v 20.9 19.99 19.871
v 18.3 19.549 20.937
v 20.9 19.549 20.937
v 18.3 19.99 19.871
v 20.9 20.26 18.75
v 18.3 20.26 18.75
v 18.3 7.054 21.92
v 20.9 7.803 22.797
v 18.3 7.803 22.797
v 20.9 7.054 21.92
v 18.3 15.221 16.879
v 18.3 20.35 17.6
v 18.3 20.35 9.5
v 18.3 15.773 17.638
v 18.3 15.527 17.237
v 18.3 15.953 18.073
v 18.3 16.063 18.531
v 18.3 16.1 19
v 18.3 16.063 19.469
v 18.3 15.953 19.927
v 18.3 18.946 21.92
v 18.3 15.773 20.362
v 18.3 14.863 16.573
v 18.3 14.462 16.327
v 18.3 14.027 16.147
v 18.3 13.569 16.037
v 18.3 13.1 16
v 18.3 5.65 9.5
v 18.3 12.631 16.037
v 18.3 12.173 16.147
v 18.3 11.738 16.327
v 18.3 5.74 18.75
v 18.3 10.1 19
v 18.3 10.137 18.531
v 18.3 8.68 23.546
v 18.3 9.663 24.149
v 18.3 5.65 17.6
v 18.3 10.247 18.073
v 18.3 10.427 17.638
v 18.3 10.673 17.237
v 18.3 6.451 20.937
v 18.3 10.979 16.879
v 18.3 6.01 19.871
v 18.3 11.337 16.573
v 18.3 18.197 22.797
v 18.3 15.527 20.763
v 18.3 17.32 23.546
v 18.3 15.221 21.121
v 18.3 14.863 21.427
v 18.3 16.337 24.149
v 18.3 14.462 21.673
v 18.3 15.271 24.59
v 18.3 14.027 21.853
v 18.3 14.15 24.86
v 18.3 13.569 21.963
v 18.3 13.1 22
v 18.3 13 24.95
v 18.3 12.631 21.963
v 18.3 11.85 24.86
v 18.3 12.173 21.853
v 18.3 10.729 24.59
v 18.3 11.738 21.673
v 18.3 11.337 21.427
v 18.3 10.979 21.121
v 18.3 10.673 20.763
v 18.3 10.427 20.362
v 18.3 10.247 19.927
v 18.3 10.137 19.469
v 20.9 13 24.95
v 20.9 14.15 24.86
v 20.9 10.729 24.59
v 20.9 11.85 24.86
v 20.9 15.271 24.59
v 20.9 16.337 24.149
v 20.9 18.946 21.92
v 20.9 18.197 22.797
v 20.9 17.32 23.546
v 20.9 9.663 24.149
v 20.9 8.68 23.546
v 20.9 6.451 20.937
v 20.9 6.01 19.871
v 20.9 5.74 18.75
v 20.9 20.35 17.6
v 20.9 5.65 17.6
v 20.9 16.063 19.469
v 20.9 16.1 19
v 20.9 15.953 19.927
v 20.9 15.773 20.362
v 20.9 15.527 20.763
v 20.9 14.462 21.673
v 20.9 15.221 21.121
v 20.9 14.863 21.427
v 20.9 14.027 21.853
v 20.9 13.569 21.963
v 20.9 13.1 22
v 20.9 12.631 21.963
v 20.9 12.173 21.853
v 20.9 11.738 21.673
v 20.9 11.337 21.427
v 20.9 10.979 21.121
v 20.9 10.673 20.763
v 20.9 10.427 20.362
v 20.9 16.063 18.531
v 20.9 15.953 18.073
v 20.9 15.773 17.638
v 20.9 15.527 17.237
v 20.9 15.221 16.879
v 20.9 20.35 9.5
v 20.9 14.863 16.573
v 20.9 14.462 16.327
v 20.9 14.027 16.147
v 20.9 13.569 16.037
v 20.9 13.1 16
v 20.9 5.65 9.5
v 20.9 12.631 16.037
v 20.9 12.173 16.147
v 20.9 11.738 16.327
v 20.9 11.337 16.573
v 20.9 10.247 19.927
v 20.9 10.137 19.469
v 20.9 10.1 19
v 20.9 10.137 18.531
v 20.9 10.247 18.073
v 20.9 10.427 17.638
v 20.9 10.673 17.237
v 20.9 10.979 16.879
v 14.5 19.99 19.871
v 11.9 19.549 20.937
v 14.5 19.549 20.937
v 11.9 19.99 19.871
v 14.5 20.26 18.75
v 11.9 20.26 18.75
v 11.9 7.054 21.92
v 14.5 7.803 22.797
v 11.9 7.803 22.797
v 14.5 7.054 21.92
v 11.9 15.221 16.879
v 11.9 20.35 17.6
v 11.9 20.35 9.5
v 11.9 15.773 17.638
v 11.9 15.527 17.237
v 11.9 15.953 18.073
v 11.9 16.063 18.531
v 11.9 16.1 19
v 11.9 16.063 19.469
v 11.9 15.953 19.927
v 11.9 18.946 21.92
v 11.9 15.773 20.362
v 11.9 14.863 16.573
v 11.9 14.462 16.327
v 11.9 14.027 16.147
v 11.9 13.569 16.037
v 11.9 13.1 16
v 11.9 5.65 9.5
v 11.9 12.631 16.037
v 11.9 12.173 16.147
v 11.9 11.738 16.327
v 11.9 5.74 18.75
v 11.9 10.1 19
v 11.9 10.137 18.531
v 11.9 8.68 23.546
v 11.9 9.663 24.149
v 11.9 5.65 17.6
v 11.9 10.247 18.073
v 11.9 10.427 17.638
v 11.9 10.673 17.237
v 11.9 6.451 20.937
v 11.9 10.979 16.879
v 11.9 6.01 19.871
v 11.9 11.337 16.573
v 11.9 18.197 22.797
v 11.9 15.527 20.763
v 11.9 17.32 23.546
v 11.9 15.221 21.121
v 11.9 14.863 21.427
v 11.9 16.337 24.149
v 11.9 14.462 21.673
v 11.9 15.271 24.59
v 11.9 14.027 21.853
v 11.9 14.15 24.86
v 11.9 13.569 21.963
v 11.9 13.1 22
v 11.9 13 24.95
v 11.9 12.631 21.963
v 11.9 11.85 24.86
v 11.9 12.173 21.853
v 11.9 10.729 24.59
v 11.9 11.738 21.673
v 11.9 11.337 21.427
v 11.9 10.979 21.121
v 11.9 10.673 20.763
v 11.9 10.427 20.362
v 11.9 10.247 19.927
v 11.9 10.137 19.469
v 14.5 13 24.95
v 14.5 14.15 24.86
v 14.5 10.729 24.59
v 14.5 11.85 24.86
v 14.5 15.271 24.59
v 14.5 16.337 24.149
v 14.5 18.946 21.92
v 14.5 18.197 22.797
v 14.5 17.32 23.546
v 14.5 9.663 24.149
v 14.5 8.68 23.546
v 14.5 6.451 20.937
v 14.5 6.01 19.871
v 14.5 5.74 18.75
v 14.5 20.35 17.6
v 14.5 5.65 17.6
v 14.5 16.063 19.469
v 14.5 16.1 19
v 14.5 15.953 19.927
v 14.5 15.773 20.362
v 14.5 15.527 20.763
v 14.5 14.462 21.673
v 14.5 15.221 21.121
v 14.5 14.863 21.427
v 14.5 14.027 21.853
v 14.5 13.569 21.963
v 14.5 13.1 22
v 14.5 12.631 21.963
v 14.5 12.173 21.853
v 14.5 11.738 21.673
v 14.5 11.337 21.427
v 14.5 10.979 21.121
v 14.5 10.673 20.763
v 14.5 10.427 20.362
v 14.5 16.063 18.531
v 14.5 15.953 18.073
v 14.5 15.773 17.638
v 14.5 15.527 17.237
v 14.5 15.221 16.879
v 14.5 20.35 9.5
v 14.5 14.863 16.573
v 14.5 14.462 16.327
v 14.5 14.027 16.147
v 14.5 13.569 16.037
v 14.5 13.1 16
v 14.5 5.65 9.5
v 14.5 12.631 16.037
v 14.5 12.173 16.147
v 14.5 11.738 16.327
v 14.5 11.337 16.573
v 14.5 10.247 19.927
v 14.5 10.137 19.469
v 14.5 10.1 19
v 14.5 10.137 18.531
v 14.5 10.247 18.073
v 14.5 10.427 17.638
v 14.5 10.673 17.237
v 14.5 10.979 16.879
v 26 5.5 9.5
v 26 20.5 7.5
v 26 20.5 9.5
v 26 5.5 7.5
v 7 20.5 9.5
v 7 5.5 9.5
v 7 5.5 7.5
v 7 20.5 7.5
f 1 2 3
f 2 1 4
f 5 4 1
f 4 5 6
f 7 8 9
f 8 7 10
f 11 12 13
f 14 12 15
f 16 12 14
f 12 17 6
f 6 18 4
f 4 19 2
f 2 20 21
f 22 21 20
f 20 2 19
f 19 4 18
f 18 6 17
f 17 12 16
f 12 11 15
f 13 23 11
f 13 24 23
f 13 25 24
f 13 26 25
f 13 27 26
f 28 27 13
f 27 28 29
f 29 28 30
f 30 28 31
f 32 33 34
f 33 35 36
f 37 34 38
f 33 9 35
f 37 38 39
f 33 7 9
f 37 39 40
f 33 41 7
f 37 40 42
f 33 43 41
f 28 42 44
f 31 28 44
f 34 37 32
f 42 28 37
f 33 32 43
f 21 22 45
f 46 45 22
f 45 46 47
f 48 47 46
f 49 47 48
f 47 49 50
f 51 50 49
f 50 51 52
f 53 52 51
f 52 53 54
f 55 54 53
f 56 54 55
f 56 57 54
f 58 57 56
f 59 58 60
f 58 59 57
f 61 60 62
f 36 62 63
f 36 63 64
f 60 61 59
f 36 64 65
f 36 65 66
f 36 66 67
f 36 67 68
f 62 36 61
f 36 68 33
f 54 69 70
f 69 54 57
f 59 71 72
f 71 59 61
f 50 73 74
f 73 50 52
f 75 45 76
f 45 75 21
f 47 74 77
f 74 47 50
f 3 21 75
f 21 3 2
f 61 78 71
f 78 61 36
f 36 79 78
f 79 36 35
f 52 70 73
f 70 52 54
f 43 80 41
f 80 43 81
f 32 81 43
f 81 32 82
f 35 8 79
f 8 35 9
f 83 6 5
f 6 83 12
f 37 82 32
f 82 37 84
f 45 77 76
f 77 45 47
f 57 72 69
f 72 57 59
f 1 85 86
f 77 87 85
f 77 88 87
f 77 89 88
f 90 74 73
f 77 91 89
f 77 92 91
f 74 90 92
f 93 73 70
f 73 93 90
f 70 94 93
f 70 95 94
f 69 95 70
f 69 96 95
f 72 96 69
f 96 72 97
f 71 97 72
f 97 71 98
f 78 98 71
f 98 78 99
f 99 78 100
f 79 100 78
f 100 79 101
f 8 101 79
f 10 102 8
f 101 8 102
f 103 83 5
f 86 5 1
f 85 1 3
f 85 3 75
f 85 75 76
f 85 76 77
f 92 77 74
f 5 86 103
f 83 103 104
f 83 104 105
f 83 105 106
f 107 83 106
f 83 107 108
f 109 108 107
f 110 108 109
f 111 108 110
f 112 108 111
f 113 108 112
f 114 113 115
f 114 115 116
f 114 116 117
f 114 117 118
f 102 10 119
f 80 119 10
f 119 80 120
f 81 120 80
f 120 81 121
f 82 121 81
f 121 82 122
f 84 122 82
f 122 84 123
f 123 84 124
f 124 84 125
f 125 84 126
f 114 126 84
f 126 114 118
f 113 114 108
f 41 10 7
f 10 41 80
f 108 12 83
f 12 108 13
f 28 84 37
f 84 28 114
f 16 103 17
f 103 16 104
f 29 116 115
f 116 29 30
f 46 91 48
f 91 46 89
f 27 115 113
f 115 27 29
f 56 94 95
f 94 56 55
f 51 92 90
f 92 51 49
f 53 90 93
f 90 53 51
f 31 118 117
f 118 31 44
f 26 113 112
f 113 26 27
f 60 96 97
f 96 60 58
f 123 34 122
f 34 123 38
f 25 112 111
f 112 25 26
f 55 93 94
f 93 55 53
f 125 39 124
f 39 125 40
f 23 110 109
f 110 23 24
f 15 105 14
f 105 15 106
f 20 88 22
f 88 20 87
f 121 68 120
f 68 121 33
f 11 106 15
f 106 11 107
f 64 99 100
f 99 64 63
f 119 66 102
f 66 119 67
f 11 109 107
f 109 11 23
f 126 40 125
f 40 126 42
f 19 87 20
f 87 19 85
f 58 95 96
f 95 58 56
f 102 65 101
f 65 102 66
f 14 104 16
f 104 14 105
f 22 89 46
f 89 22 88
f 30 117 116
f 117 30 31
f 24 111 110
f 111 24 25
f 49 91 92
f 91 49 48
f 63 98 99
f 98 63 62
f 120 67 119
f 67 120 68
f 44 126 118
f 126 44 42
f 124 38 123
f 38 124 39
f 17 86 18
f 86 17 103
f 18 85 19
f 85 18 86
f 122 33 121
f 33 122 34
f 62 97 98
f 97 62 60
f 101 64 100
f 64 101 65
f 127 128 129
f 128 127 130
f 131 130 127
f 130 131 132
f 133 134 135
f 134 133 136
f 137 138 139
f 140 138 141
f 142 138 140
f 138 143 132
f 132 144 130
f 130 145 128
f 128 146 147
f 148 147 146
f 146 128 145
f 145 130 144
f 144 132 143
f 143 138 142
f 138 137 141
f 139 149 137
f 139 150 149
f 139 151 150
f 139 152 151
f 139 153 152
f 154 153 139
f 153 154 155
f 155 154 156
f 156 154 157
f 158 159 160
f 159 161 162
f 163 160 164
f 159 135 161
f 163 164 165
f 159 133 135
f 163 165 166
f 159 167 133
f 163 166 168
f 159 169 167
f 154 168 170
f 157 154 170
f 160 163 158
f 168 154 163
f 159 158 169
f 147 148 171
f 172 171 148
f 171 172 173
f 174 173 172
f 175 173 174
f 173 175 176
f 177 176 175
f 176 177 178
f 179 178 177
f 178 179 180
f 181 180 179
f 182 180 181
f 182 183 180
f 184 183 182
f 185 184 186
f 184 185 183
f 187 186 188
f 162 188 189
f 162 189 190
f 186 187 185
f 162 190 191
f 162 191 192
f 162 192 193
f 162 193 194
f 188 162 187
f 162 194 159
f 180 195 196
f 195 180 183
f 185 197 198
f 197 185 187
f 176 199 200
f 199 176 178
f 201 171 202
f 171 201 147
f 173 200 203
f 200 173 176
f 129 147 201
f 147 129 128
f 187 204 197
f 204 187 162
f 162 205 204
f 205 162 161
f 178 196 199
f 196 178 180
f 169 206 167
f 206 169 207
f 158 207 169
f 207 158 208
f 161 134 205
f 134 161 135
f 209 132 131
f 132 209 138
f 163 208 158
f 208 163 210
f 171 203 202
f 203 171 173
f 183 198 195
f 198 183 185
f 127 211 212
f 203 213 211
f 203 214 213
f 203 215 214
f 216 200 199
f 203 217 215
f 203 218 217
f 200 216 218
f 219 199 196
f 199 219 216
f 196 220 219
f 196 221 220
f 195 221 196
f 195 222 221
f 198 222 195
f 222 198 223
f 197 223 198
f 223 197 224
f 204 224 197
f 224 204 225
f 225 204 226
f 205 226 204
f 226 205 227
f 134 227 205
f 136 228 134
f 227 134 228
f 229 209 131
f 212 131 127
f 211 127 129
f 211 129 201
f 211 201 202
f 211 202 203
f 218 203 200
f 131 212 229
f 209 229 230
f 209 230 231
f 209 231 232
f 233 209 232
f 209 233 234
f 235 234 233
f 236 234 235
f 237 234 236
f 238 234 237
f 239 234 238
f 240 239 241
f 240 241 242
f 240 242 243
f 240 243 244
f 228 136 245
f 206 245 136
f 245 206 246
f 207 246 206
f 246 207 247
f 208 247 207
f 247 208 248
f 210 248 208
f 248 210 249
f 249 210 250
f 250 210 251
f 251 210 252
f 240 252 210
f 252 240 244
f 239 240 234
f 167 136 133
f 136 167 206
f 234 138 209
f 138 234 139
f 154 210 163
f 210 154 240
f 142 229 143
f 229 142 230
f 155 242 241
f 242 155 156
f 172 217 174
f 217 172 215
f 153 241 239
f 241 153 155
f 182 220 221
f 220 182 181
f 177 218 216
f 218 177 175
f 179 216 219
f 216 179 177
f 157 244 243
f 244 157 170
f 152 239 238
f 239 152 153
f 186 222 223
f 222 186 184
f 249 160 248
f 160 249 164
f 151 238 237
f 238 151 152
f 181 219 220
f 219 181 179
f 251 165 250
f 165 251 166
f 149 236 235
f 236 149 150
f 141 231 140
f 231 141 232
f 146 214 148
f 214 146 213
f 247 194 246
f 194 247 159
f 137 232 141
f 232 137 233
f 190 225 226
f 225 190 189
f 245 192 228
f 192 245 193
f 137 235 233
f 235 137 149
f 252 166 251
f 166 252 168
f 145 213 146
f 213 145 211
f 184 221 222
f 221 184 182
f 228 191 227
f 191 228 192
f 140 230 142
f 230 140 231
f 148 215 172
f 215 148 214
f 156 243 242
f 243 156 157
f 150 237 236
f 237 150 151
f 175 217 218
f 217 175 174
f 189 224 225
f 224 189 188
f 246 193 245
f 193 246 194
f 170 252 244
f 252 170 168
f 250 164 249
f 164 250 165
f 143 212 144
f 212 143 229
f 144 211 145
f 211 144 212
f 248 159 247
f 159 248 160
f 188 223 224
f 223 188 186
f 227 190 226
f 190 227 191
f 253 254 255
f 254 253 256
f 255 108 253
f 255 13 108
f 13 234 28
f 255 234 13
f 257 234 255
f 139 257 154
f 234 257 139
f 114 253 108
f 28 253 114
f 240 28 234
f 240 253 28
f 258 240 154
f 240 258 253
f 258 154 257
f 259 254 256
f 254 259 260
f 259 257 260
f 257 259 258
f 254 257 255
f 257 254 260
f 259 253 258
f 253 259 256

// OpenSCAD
$fn = 40;

module connector(wall=2) {
  translate
([7, 5.5, 7.5]) {
    cube([19, 15, wall]);
  }
  translate([26.5, 5.4, 7.4]) {
    rotate([0, 90, 90]) {
      for(y=[0, 6.4]) {
        translate([-10.2, 6.9+y, 7.6]) {
          rotate([90, 0, 0]) {
            difference() {
              union() {
                cylinder(d=14.7, h=2.6, center=true);
                translate([5, 0, 0]) {
                  cube([10, 14.7, 2.6], center=true);
                }
              }
              translate([-1.4, 0.1, 0]) {
                cylinder(d=6, h=3, center=true);
              }
            }
          }
        }
      }
    }
  }
}

connector();
